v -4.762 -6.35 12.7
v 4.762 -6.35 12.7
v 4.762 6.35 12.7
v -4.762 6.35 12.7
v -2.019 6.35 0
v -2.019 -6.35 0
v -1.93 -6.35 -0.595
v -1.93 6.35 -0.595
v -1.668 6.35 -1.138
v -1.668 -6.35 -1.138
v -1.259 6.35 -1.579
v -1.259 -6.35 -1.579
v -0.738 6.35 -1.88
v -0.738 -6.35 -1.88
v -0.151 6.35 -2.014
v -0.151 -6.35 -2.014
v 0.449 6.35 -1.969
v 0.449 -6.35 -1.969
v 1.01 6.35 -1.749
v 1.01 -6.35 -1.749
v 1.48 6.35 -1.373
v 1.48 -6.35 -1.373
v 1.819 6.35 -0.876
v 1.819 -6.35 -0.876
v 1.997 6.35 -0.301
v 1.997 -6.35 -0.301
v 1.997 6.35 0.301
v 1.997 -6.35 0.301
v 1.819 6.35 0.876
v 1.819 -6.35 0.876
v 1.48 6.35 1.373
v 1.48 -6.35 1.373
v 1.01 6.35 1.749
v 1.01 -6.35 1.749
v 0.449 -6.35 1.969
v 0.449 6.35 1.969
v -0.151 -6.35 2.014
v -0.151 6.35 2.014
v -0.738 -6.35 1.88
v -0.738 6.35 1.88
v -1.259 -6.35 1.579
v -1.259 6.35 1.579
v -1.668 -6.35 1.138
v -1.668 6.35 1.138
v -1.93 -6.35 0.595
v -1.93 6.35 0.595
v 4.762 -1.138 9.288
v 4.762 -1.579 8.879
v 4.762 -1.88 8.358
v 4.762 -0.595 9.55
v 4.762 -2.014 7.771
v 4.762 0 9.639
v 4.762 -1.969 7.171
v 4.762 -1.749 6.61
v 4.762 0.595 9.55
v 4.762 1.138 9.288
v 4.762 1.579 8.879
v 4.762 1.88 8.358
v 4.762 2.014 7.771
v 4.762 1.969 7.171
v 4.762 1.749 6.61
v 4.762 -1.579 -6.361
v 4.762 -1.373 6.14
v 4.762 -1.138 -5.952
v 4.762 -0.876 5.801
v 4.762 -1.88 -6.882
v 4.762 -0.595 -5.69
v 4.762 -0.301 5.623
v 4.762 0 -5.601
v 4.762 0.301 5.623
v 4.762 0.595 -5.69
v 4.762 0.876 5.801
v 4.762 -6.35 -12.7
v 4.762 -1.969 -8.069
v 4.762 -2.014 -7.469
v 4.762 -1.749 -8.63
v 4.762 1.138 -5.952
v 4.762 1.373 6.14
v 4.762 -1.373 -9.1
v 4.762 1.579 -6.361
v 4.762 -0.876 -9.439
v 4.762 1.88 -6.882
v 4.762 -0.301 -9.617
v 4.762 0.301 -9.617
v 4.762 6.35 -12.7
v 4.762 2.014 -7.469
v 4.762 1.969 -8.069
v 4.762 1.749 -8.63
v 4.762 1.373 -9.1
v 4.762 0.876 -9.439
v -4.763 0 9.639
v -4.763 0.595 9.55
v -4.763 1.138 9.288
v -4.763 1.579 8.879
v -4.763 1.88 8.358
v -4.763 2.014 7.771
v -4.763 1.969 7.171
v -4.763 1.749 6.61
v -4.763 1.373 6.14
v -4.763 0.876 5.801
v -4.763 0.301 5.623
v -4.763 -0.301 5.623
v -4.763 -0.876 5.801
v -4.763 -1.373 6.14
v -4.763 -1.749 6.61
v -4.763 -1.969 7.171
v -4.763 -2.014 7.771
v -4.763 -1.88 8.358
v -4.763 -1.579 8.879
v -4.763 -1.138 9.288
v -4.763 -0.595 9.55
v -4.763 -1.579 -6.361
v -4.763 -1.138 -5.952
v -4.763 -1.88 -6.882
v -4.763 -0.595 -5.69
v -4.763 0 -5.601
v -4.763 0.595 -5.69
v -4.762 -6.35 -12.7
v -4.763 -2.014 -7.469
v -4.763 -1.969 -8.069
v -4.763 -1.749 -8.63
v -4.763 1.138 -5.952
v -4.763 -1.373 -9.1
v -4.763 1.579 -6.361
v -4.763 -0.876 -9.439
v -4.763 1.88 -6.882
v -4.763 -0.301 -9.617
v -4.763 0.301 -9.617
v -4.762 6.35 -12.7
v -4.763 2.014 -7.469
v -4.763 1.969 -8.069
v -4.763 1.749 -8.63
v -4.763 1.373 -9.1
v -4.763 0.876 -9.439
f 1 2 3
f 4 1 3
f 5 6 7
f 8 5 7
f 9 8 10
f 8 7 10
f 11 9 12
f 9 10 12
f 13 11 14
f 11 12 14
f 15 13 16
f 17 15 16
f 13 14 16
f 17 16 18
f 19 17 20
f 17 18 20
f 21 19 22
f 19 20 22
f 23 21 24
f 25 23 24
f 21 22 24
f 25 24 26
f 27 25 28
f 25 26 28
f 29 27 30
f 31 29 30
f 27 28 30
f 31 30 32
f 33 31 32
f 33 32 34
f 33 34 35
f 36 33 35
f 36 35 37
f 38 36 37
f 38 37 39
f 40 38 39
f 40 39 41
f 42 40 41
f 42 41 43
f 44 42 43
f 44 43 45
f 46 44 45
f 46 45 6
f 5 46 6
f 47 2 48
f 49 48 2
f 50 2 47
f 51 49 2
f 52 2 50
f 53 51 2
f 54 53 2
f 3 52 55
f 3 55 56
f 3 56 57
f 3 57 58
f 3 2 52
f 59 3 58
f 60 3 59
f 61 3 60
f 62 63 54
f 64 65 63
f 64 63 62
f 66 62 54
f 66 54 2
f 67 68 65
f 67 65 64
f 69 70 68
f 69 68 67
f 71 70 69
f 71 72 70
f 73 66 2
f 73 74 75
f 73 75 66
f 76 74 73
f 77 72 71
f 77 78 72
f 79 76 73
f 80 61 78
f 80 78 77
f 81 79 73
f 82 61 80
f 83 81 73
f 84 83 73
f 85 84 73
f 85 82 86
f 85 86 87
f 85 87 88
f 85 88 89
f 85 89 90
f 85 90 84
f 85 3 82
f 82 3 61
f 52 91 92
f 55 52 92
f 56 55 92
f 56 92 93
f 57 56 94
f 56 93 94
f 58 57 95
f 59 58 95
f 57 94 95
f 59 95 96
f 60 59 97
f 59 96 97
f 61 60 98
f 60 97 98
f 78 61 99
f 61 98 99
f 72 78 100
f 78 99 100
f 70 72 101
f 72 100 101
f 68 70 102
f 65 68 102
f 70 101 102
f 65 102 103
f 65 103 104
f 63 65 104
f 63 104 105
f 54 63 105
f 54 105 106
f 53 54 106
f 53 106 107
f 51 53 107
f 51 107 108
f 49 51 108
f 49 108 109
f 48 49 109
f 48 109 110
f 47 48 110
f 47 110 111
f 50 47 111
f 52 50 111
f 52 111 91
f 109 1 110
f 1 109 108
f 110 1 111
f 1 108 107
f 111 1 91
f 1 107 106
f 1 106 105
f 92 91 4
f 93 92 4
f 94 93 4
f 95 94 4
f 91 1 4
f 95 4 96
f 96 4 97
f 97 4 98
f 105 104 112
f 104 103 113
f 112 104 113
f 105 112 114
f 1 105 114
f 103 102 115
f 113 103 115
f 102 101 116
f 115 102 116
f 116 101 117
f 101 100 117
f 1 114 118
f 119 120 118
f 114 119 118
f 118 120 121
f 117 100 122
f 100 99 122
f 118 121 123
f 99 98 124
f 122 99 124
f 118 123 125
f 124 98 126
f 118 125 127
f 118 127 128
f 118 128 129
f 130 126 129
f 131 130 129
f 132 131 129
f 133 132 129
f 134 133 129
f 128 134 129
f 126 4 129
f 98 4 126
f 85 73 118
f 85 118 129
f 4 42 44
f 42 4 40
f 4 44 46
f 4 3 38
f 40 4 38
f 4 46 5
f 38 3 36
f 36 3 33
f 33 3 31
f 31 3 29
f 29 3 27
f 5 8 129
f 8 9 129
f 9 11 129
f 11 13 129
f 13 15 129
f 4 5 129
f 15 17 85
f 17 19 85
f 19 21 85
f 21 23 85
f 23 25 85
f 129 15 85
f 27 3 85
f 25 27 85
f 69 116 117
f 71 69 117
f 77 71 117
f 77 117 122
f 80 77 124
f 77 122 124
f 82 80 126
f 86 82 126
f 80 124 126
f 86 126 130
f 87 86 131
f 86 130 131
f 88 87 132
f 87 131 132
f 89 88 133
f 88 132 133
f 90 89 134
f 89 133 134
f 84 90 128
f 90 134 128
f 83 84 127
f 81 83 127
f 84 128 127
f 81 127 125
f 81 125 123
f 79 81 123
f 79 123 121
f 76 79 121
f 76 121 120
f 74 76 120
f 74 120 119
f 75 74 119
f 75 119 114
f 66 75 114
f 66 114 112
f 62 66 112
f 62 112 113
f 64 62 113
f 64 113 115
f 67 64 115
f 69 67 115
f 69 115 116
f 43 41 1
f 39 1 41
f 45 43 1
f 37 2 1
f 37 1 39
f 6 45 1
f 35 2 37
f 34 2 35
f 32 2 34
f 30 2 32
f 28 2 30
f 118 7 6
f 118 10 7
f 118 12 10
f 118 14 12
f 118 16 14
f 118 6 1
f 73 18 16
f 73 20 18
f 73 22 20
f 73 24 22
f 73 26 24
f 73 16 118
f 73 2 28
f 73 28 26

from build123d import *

# Parameters (mm, degrees)
SKETCH1_W              = 25.4
SKETCH1_H              = 12.7
BOSS_EXTRUDE1_DEPTH    = 4.7625
F_10_32_TAPPED_HOLE1_D = 4.0386
F_10_32_TAPPED_HOLE2_D = 4.0386


with BuildPart() as part:
    # Sketch1 → Boss-Extrude1 (new, symmetric)
    with BuildSketch(Plane(origin=(0, 0, 0), x_dir=(0, 0, -1), z_dir=(1, 0, 0))):
        Rectangle(SKETCH1_W, SKETCH1_H)
    extrude(amount=BOSS_EXTRUDE1_DEPTH, both=True)

    # #10-32 Tapped Hole1 (through all)
    with Locations(Plane(origin=(0, 6.35, 0), x_dir=(1, 0, 0), z_dir=(0, 1, 0))):
        with Locations((0, 0)):
            Hole(F_10_32_TAPPED_HOLE1_D / 2)

    # #10-32 Tapped Hole2 (through all)
    with Locations(Plane(origin=(4.7625, 0, 0), x_dir=(0, 0, -1), z_dir=(1, 0, 0))):
        with Locations((-7.62, 0), (7.62, 0)):
            Hole(F_10_32_TAPPED_HOLE2_D / 2)


solid = part.part
